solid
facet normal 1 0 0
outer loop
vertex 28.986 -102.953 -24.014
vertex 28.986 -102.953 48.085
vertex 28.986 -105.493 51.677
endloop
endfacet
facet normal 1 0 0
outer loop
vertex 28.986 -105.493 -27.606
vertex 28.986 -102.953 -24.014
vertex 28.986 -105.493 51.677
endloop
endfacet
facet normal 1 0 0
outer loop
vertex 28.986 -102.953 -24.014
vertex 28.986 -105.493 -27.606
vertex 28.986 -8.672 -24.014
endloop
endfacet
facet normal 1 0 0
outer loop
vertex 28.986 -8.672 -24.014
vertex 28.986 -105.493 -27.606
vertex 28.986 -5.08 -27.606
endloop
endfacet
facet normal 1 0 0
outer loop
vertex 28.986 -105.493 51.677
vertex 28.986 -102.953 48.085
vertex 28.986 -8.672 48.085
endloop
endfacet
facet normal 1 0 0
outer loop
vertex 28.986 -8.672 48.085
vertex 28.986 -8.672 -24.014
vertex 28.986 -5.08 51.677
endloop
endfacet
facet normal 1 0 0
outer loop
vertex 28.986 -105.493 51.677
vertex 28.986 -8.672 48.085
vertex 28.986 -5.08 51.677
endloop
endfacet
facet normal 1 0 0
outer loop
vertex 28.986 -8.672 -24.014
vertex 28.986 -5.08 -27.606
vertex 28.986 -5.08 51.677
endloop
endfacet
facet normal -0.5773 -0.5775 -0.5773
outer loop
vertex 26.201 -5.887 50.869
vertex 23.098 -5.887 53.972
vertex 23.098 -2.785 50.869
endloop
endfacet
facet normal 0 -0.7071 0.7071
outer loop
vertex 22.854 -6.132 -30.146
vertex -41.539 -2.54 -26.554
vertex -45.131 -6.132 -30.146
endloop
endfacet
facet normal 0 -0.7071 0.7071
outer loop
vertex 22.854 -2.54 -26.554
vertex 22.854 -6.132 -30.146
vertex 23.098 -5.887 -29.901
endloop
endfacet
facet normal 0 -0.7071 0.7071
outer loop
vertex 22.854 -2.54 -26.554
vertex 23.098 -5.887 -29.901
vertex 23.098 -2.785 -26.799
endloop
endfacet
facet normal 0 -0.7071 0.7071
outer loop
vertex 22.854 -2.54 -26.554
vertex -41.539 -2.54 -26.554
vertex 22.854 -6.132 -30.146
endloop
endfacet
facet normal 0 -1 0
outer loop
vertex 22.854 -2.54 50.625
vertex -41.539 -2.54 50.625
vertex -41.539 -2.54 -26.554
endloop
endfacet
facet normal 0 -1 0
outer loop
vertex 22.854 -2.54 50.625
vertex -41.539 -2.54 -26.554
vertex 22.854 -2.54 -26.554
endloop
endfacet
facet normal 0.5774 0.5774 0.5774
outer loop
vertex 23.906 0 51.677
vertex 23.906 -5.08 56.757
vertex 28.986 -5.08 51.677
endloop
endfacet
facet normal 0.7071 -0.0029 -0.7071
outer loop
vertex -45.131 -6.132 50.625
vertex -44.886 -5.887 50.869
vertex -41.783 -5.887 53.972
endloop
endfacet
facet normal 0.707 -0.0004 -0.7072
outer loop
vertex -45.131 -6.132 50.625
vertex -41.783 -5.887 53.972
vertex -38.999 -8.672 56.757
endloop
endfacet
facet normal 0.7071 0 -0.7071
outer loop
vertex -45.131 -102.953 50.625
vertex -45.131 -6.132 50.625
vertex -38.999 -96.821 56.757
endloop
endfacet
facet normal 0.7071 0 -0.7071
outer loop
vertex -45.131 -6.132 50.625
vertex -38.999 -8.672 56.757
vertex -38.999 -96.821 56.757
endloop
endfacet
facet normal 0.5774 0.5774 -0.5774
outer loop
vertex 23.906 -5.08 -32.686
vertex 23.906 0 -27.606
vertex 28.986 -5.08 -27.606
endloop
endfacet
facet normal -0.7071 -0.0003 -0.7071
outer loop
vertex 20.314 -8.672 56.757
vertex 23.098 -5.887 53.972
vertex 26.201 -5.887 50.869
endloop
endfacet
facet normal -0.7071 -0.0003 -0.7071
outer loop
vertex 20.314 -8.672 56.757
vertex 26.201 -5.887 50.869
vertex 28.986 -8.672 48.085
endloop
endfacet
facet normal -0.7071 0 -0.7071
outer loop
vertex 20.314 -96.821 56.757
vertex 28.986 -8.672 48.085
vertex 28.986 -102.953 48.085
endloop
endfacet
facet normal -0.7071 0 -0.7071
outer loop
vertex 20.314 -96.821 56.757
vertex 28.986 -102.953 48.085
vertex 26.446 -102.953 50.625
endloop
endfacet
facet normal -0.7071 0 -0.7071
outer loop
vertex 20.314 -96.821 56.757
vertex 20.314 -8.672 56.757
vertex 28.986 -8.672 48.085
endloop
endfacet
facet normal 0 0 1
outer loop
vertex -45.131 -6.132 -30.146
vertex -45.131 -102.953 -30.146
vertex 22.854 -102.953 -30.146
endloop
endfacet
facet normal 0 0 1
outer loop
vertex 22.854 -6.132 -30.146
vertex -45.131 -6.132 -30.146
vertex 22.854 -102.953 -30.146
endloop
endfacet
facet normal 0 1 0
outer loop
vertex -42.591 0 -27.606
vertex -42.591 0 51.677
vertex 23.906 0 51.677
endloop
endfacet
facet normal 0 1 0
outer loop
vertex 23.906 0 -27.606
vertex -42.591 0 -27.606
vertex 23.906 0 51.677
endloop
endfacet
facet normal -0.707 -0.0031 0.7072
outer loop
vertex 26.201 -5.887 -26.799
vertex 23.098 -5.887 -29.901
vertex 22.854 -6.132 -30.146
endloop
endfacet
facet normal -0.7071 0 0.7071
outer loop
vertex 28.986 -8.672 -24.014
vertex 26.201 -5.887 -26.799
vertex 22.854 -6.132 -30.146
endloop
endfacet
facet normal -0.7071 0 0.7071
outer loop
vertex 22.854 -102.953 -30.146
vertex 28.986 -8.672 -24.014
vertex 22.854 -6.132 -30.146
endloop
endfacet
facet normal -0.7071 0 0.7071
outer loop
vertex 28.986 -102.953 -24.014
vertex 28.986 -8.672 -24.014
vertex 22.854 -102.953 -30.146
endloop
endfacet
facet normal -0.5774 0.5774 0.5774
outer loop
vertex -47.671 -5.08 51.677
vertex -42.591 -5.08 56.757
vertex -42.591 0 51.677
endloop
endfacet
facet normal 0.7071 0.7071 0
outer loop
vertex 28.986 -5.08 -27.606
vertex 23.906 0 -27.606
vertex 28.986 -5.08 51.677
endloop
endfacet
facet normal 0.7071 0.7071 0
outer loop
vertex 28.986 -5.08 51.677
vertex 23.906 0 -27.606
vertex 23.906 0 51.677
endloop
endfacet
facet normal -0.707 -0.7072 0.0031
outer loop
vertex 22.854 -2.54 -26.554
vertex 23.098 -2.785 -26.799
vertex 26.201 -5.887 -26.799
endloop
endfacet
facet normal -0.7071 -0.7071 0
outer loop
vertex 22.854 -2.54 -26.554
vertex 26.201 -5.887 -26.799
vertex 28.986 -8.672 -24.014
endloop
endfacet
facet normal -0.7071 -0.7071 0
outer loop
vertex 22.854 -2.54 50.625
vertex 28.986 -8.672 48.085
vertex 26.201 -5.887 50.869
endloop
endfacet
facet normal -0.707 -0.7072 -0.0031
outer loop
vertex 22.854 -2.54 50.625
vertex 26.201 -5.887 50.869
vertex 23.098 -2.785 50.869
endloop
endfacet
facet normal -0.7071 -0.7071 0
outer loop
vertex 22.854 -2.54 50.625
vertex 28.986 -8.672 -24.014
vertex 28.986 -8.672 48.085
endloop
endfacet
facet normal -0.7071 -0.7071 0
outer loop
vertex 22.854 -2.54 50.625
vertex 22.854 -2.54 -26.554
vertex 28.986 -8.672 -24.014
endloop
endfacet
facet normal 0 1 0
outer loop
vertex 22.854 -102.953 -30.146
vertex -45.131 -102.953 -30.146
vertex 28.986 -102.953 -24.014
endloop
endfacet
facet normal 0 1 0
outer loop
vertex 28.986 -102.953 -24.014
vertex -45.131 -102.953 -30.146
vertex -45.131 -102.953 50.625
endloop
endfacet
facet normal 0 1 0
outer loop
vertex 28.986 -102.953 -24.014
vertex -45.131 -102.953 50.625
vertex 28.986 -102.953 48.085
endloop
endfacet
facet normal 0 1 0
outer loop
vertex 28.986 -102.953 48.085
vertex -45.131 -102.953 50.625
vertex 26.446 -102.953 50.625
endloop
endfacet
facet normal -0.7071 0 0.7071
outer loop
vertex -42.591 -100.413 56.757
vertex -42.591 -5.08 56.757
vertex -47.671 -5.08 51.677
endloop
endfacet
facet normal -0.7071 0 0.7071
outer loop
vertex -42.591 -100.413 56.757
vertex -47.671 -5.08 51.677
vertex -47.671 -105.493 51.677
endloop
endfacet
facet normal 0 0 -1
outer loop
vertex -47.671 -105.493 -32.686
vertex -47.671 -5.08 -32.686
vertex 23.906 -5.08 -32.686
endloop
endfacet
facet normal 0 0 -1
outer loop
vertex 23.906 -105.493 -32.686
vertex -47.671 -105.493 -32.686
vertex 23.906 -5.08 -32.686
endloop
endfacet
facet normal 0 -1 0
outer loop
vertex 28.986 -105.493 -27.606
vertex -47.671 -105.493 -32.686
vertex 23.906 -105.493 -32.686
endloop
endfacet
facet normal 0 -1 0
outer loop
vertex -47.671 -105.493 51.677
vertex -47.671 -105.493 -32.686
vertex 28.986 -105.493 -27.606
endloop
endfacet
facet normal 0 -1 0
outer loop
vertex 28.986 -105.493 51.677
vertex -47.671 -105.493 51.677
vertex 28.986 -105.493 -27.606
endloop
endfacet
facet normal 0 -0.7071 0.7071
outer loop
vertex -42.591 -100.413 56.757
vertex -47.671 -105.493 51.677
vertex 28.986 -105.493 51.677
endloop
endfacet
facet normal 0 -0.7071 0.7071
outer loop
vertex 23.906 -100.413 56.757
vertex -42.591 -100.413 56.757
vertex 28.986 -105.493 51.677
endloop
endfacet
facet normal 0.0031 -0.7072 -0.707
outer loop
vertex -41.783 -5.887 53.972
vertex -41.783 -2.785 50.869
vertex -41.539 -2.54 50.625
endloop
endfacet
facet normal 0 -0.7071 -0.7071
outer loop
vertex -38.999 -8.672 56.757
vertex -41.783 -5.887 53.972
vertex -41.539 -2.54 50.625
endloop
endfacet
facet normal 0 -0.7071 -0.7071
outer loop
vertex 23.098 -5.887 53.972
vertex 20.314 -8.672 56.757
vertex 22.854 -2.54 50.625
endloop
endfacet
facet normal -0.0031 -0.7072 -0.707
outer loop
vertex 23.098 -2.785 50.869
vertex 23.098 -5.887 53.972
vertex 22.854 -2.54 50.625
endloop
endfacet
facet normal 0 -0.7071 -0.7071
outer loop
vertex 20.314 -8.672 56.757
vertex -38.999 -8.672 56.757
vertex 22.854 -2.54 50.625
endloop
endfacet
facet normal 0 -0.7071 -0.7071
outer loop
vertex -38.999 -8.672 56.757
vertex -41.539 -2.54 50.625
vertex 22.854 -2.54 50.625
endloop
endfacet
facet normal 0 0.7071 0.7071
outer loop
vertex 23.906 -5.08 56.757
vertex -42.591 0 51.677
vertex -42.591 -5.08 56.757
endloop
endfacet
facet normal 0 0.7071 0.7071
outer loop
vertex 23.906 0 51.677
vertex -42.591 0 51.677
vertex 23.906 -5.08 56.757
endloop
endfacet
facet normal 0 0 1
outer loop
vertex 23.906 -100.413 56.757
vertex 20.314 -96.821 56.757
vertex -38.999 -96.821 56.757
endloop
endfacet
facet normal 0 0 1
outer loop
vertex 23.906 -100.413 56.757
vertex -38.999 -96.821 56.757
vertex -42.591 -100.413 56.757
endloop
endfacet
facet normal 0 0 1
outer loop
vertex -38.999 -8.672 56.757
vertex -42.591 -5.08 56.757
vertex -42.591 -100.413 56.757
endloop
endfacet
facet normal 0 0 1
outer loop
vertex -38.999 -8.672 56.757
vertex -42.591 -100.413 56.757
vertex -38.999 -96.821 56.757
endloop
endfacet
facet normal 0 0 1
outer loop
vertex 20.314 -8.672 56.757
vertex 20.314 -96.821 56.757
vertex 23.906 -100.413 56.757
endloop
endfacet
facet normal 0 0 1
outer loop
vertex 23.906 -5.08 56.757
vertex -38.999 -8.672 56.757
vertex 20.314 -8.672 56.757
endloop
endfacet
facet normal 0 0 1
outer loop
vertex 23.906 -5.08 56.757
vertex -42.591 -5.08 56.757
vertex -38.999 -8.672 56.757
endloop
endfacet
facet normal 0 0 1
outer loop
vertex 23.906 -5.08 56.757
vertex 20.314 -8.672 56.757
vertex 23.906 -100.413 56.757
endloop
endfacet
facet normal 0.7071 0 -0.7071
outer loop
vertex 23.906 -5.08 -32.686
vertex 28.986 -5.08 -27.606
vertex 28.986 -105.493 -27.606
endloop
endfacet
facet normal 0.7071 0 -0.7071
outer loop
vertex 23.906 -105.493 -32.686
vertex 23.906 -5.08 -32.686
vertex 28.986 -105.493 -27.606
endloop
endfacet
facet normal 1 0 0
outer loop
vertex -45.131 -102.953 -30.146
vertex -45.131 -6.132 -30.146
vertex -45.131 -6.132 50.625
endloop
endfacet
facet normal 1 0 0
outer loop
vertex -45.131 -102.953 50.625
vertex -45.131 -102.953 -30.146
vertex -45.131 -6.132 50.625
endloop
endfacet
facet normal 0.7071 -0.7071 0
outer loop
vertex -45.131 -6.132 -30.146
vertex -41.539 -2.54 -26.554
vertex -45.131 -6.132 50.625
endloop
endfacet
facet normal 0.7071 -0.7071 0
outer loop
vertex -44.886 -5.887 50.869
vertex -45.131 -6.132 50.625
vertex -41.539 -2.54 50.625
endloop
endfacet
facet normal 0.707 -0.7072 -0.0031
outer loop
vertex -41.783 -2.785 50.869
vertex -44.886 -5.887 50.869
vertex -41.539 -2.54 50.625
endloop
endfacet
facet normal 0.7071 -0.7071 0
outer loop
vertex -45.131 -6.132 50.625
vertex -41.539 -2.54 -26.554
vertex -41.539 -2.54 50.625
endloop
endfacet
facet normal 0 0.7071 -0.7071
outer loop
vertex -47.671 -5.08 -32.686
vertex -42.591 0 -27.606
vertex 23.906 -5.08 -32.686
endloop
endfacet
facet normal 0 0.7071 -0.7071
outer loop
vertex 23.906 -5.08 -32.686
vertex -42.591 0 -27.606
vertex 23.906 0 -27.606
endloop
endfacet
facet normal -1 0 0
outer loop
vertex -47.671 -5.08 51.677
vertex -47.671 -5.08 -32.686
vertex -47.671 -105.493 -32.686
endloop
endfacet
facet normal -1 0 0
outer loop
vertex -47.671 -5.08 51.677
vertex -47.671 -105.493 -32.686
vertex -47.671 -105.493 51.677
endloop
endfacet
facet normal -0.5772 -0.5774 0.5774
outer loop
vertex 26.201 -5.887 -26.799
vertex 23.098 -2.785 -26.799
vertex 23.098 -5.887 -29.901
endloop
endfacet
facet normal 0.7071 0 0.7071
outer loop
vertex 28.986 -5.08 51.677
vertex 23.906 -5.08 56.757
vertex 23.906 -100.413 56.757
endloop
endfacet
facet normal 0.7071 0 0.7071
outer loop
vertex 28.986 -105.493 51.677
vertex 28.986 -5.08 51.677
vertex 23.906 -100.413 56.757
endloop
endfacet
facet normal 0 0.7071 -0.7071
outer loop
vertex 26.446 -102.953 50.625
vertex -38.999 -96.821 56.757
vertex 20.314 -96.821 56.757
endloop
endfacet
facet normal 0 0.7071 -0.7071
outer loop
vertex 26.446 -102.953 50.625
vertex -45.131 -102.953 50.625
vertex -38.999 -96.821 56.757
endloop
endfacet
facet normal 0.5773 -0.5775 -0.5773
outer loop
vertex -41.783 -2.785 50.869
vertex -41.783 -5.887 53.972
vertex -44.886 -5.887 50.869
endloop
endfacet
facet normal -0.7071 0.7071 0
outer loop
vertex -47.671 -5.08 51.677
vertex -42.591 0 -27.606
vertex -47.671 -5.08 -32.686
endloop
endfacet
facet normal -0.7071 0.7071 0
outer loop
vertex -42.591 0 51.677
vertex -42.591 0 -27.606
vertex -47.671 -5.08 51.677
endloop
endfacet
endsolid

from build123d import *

# Parameters (mm, degrees)
F1_W     = 76.656278
F1_H     = 89.442563
F2_DEPTH = 105.492987
F4_SIZE  = 5.08
F5_T     = -2.54


with BuildPart() as f2:
    # F1 (on face) → F2 (new body)
    with BuildSketch(Plane.XZ):
        with Locations((-9.342497, 12.035428)):
            Rectangle(F1_W, F1_H)
    extrude(amount=F2_DEPTH)

    # F4
    f4_edges = [f2.edges().sort_by_distance(p)[0] for p in [
        (-9.342497, 0, 56.756709),
        (28.985642, -52.746493, 56.756709),
        (-47.670636, -52.746493, 56.756709),
        (-9.342497, -105.492987, 56.756709),
        (-9.342497, 0, -32.685854),
        (28.985642, 0, 12.035428),
        (-47.670636, 0, 12.035428),
        (28.985642, -52.746493, -32.685854),
    ]]
    chamfer(f4_edges, length=F4_SIZE)

    # F5
    f5_openings = [f2.faces().sort_by_distance(p)[0] for p in [
        (28.985642, -55.286493, 12.035428),
        (-9.342497, -52.746493, 56.756709),
    ]]
    offset(amount=F5_T, openings=f5_openings)


solid = f2.part
